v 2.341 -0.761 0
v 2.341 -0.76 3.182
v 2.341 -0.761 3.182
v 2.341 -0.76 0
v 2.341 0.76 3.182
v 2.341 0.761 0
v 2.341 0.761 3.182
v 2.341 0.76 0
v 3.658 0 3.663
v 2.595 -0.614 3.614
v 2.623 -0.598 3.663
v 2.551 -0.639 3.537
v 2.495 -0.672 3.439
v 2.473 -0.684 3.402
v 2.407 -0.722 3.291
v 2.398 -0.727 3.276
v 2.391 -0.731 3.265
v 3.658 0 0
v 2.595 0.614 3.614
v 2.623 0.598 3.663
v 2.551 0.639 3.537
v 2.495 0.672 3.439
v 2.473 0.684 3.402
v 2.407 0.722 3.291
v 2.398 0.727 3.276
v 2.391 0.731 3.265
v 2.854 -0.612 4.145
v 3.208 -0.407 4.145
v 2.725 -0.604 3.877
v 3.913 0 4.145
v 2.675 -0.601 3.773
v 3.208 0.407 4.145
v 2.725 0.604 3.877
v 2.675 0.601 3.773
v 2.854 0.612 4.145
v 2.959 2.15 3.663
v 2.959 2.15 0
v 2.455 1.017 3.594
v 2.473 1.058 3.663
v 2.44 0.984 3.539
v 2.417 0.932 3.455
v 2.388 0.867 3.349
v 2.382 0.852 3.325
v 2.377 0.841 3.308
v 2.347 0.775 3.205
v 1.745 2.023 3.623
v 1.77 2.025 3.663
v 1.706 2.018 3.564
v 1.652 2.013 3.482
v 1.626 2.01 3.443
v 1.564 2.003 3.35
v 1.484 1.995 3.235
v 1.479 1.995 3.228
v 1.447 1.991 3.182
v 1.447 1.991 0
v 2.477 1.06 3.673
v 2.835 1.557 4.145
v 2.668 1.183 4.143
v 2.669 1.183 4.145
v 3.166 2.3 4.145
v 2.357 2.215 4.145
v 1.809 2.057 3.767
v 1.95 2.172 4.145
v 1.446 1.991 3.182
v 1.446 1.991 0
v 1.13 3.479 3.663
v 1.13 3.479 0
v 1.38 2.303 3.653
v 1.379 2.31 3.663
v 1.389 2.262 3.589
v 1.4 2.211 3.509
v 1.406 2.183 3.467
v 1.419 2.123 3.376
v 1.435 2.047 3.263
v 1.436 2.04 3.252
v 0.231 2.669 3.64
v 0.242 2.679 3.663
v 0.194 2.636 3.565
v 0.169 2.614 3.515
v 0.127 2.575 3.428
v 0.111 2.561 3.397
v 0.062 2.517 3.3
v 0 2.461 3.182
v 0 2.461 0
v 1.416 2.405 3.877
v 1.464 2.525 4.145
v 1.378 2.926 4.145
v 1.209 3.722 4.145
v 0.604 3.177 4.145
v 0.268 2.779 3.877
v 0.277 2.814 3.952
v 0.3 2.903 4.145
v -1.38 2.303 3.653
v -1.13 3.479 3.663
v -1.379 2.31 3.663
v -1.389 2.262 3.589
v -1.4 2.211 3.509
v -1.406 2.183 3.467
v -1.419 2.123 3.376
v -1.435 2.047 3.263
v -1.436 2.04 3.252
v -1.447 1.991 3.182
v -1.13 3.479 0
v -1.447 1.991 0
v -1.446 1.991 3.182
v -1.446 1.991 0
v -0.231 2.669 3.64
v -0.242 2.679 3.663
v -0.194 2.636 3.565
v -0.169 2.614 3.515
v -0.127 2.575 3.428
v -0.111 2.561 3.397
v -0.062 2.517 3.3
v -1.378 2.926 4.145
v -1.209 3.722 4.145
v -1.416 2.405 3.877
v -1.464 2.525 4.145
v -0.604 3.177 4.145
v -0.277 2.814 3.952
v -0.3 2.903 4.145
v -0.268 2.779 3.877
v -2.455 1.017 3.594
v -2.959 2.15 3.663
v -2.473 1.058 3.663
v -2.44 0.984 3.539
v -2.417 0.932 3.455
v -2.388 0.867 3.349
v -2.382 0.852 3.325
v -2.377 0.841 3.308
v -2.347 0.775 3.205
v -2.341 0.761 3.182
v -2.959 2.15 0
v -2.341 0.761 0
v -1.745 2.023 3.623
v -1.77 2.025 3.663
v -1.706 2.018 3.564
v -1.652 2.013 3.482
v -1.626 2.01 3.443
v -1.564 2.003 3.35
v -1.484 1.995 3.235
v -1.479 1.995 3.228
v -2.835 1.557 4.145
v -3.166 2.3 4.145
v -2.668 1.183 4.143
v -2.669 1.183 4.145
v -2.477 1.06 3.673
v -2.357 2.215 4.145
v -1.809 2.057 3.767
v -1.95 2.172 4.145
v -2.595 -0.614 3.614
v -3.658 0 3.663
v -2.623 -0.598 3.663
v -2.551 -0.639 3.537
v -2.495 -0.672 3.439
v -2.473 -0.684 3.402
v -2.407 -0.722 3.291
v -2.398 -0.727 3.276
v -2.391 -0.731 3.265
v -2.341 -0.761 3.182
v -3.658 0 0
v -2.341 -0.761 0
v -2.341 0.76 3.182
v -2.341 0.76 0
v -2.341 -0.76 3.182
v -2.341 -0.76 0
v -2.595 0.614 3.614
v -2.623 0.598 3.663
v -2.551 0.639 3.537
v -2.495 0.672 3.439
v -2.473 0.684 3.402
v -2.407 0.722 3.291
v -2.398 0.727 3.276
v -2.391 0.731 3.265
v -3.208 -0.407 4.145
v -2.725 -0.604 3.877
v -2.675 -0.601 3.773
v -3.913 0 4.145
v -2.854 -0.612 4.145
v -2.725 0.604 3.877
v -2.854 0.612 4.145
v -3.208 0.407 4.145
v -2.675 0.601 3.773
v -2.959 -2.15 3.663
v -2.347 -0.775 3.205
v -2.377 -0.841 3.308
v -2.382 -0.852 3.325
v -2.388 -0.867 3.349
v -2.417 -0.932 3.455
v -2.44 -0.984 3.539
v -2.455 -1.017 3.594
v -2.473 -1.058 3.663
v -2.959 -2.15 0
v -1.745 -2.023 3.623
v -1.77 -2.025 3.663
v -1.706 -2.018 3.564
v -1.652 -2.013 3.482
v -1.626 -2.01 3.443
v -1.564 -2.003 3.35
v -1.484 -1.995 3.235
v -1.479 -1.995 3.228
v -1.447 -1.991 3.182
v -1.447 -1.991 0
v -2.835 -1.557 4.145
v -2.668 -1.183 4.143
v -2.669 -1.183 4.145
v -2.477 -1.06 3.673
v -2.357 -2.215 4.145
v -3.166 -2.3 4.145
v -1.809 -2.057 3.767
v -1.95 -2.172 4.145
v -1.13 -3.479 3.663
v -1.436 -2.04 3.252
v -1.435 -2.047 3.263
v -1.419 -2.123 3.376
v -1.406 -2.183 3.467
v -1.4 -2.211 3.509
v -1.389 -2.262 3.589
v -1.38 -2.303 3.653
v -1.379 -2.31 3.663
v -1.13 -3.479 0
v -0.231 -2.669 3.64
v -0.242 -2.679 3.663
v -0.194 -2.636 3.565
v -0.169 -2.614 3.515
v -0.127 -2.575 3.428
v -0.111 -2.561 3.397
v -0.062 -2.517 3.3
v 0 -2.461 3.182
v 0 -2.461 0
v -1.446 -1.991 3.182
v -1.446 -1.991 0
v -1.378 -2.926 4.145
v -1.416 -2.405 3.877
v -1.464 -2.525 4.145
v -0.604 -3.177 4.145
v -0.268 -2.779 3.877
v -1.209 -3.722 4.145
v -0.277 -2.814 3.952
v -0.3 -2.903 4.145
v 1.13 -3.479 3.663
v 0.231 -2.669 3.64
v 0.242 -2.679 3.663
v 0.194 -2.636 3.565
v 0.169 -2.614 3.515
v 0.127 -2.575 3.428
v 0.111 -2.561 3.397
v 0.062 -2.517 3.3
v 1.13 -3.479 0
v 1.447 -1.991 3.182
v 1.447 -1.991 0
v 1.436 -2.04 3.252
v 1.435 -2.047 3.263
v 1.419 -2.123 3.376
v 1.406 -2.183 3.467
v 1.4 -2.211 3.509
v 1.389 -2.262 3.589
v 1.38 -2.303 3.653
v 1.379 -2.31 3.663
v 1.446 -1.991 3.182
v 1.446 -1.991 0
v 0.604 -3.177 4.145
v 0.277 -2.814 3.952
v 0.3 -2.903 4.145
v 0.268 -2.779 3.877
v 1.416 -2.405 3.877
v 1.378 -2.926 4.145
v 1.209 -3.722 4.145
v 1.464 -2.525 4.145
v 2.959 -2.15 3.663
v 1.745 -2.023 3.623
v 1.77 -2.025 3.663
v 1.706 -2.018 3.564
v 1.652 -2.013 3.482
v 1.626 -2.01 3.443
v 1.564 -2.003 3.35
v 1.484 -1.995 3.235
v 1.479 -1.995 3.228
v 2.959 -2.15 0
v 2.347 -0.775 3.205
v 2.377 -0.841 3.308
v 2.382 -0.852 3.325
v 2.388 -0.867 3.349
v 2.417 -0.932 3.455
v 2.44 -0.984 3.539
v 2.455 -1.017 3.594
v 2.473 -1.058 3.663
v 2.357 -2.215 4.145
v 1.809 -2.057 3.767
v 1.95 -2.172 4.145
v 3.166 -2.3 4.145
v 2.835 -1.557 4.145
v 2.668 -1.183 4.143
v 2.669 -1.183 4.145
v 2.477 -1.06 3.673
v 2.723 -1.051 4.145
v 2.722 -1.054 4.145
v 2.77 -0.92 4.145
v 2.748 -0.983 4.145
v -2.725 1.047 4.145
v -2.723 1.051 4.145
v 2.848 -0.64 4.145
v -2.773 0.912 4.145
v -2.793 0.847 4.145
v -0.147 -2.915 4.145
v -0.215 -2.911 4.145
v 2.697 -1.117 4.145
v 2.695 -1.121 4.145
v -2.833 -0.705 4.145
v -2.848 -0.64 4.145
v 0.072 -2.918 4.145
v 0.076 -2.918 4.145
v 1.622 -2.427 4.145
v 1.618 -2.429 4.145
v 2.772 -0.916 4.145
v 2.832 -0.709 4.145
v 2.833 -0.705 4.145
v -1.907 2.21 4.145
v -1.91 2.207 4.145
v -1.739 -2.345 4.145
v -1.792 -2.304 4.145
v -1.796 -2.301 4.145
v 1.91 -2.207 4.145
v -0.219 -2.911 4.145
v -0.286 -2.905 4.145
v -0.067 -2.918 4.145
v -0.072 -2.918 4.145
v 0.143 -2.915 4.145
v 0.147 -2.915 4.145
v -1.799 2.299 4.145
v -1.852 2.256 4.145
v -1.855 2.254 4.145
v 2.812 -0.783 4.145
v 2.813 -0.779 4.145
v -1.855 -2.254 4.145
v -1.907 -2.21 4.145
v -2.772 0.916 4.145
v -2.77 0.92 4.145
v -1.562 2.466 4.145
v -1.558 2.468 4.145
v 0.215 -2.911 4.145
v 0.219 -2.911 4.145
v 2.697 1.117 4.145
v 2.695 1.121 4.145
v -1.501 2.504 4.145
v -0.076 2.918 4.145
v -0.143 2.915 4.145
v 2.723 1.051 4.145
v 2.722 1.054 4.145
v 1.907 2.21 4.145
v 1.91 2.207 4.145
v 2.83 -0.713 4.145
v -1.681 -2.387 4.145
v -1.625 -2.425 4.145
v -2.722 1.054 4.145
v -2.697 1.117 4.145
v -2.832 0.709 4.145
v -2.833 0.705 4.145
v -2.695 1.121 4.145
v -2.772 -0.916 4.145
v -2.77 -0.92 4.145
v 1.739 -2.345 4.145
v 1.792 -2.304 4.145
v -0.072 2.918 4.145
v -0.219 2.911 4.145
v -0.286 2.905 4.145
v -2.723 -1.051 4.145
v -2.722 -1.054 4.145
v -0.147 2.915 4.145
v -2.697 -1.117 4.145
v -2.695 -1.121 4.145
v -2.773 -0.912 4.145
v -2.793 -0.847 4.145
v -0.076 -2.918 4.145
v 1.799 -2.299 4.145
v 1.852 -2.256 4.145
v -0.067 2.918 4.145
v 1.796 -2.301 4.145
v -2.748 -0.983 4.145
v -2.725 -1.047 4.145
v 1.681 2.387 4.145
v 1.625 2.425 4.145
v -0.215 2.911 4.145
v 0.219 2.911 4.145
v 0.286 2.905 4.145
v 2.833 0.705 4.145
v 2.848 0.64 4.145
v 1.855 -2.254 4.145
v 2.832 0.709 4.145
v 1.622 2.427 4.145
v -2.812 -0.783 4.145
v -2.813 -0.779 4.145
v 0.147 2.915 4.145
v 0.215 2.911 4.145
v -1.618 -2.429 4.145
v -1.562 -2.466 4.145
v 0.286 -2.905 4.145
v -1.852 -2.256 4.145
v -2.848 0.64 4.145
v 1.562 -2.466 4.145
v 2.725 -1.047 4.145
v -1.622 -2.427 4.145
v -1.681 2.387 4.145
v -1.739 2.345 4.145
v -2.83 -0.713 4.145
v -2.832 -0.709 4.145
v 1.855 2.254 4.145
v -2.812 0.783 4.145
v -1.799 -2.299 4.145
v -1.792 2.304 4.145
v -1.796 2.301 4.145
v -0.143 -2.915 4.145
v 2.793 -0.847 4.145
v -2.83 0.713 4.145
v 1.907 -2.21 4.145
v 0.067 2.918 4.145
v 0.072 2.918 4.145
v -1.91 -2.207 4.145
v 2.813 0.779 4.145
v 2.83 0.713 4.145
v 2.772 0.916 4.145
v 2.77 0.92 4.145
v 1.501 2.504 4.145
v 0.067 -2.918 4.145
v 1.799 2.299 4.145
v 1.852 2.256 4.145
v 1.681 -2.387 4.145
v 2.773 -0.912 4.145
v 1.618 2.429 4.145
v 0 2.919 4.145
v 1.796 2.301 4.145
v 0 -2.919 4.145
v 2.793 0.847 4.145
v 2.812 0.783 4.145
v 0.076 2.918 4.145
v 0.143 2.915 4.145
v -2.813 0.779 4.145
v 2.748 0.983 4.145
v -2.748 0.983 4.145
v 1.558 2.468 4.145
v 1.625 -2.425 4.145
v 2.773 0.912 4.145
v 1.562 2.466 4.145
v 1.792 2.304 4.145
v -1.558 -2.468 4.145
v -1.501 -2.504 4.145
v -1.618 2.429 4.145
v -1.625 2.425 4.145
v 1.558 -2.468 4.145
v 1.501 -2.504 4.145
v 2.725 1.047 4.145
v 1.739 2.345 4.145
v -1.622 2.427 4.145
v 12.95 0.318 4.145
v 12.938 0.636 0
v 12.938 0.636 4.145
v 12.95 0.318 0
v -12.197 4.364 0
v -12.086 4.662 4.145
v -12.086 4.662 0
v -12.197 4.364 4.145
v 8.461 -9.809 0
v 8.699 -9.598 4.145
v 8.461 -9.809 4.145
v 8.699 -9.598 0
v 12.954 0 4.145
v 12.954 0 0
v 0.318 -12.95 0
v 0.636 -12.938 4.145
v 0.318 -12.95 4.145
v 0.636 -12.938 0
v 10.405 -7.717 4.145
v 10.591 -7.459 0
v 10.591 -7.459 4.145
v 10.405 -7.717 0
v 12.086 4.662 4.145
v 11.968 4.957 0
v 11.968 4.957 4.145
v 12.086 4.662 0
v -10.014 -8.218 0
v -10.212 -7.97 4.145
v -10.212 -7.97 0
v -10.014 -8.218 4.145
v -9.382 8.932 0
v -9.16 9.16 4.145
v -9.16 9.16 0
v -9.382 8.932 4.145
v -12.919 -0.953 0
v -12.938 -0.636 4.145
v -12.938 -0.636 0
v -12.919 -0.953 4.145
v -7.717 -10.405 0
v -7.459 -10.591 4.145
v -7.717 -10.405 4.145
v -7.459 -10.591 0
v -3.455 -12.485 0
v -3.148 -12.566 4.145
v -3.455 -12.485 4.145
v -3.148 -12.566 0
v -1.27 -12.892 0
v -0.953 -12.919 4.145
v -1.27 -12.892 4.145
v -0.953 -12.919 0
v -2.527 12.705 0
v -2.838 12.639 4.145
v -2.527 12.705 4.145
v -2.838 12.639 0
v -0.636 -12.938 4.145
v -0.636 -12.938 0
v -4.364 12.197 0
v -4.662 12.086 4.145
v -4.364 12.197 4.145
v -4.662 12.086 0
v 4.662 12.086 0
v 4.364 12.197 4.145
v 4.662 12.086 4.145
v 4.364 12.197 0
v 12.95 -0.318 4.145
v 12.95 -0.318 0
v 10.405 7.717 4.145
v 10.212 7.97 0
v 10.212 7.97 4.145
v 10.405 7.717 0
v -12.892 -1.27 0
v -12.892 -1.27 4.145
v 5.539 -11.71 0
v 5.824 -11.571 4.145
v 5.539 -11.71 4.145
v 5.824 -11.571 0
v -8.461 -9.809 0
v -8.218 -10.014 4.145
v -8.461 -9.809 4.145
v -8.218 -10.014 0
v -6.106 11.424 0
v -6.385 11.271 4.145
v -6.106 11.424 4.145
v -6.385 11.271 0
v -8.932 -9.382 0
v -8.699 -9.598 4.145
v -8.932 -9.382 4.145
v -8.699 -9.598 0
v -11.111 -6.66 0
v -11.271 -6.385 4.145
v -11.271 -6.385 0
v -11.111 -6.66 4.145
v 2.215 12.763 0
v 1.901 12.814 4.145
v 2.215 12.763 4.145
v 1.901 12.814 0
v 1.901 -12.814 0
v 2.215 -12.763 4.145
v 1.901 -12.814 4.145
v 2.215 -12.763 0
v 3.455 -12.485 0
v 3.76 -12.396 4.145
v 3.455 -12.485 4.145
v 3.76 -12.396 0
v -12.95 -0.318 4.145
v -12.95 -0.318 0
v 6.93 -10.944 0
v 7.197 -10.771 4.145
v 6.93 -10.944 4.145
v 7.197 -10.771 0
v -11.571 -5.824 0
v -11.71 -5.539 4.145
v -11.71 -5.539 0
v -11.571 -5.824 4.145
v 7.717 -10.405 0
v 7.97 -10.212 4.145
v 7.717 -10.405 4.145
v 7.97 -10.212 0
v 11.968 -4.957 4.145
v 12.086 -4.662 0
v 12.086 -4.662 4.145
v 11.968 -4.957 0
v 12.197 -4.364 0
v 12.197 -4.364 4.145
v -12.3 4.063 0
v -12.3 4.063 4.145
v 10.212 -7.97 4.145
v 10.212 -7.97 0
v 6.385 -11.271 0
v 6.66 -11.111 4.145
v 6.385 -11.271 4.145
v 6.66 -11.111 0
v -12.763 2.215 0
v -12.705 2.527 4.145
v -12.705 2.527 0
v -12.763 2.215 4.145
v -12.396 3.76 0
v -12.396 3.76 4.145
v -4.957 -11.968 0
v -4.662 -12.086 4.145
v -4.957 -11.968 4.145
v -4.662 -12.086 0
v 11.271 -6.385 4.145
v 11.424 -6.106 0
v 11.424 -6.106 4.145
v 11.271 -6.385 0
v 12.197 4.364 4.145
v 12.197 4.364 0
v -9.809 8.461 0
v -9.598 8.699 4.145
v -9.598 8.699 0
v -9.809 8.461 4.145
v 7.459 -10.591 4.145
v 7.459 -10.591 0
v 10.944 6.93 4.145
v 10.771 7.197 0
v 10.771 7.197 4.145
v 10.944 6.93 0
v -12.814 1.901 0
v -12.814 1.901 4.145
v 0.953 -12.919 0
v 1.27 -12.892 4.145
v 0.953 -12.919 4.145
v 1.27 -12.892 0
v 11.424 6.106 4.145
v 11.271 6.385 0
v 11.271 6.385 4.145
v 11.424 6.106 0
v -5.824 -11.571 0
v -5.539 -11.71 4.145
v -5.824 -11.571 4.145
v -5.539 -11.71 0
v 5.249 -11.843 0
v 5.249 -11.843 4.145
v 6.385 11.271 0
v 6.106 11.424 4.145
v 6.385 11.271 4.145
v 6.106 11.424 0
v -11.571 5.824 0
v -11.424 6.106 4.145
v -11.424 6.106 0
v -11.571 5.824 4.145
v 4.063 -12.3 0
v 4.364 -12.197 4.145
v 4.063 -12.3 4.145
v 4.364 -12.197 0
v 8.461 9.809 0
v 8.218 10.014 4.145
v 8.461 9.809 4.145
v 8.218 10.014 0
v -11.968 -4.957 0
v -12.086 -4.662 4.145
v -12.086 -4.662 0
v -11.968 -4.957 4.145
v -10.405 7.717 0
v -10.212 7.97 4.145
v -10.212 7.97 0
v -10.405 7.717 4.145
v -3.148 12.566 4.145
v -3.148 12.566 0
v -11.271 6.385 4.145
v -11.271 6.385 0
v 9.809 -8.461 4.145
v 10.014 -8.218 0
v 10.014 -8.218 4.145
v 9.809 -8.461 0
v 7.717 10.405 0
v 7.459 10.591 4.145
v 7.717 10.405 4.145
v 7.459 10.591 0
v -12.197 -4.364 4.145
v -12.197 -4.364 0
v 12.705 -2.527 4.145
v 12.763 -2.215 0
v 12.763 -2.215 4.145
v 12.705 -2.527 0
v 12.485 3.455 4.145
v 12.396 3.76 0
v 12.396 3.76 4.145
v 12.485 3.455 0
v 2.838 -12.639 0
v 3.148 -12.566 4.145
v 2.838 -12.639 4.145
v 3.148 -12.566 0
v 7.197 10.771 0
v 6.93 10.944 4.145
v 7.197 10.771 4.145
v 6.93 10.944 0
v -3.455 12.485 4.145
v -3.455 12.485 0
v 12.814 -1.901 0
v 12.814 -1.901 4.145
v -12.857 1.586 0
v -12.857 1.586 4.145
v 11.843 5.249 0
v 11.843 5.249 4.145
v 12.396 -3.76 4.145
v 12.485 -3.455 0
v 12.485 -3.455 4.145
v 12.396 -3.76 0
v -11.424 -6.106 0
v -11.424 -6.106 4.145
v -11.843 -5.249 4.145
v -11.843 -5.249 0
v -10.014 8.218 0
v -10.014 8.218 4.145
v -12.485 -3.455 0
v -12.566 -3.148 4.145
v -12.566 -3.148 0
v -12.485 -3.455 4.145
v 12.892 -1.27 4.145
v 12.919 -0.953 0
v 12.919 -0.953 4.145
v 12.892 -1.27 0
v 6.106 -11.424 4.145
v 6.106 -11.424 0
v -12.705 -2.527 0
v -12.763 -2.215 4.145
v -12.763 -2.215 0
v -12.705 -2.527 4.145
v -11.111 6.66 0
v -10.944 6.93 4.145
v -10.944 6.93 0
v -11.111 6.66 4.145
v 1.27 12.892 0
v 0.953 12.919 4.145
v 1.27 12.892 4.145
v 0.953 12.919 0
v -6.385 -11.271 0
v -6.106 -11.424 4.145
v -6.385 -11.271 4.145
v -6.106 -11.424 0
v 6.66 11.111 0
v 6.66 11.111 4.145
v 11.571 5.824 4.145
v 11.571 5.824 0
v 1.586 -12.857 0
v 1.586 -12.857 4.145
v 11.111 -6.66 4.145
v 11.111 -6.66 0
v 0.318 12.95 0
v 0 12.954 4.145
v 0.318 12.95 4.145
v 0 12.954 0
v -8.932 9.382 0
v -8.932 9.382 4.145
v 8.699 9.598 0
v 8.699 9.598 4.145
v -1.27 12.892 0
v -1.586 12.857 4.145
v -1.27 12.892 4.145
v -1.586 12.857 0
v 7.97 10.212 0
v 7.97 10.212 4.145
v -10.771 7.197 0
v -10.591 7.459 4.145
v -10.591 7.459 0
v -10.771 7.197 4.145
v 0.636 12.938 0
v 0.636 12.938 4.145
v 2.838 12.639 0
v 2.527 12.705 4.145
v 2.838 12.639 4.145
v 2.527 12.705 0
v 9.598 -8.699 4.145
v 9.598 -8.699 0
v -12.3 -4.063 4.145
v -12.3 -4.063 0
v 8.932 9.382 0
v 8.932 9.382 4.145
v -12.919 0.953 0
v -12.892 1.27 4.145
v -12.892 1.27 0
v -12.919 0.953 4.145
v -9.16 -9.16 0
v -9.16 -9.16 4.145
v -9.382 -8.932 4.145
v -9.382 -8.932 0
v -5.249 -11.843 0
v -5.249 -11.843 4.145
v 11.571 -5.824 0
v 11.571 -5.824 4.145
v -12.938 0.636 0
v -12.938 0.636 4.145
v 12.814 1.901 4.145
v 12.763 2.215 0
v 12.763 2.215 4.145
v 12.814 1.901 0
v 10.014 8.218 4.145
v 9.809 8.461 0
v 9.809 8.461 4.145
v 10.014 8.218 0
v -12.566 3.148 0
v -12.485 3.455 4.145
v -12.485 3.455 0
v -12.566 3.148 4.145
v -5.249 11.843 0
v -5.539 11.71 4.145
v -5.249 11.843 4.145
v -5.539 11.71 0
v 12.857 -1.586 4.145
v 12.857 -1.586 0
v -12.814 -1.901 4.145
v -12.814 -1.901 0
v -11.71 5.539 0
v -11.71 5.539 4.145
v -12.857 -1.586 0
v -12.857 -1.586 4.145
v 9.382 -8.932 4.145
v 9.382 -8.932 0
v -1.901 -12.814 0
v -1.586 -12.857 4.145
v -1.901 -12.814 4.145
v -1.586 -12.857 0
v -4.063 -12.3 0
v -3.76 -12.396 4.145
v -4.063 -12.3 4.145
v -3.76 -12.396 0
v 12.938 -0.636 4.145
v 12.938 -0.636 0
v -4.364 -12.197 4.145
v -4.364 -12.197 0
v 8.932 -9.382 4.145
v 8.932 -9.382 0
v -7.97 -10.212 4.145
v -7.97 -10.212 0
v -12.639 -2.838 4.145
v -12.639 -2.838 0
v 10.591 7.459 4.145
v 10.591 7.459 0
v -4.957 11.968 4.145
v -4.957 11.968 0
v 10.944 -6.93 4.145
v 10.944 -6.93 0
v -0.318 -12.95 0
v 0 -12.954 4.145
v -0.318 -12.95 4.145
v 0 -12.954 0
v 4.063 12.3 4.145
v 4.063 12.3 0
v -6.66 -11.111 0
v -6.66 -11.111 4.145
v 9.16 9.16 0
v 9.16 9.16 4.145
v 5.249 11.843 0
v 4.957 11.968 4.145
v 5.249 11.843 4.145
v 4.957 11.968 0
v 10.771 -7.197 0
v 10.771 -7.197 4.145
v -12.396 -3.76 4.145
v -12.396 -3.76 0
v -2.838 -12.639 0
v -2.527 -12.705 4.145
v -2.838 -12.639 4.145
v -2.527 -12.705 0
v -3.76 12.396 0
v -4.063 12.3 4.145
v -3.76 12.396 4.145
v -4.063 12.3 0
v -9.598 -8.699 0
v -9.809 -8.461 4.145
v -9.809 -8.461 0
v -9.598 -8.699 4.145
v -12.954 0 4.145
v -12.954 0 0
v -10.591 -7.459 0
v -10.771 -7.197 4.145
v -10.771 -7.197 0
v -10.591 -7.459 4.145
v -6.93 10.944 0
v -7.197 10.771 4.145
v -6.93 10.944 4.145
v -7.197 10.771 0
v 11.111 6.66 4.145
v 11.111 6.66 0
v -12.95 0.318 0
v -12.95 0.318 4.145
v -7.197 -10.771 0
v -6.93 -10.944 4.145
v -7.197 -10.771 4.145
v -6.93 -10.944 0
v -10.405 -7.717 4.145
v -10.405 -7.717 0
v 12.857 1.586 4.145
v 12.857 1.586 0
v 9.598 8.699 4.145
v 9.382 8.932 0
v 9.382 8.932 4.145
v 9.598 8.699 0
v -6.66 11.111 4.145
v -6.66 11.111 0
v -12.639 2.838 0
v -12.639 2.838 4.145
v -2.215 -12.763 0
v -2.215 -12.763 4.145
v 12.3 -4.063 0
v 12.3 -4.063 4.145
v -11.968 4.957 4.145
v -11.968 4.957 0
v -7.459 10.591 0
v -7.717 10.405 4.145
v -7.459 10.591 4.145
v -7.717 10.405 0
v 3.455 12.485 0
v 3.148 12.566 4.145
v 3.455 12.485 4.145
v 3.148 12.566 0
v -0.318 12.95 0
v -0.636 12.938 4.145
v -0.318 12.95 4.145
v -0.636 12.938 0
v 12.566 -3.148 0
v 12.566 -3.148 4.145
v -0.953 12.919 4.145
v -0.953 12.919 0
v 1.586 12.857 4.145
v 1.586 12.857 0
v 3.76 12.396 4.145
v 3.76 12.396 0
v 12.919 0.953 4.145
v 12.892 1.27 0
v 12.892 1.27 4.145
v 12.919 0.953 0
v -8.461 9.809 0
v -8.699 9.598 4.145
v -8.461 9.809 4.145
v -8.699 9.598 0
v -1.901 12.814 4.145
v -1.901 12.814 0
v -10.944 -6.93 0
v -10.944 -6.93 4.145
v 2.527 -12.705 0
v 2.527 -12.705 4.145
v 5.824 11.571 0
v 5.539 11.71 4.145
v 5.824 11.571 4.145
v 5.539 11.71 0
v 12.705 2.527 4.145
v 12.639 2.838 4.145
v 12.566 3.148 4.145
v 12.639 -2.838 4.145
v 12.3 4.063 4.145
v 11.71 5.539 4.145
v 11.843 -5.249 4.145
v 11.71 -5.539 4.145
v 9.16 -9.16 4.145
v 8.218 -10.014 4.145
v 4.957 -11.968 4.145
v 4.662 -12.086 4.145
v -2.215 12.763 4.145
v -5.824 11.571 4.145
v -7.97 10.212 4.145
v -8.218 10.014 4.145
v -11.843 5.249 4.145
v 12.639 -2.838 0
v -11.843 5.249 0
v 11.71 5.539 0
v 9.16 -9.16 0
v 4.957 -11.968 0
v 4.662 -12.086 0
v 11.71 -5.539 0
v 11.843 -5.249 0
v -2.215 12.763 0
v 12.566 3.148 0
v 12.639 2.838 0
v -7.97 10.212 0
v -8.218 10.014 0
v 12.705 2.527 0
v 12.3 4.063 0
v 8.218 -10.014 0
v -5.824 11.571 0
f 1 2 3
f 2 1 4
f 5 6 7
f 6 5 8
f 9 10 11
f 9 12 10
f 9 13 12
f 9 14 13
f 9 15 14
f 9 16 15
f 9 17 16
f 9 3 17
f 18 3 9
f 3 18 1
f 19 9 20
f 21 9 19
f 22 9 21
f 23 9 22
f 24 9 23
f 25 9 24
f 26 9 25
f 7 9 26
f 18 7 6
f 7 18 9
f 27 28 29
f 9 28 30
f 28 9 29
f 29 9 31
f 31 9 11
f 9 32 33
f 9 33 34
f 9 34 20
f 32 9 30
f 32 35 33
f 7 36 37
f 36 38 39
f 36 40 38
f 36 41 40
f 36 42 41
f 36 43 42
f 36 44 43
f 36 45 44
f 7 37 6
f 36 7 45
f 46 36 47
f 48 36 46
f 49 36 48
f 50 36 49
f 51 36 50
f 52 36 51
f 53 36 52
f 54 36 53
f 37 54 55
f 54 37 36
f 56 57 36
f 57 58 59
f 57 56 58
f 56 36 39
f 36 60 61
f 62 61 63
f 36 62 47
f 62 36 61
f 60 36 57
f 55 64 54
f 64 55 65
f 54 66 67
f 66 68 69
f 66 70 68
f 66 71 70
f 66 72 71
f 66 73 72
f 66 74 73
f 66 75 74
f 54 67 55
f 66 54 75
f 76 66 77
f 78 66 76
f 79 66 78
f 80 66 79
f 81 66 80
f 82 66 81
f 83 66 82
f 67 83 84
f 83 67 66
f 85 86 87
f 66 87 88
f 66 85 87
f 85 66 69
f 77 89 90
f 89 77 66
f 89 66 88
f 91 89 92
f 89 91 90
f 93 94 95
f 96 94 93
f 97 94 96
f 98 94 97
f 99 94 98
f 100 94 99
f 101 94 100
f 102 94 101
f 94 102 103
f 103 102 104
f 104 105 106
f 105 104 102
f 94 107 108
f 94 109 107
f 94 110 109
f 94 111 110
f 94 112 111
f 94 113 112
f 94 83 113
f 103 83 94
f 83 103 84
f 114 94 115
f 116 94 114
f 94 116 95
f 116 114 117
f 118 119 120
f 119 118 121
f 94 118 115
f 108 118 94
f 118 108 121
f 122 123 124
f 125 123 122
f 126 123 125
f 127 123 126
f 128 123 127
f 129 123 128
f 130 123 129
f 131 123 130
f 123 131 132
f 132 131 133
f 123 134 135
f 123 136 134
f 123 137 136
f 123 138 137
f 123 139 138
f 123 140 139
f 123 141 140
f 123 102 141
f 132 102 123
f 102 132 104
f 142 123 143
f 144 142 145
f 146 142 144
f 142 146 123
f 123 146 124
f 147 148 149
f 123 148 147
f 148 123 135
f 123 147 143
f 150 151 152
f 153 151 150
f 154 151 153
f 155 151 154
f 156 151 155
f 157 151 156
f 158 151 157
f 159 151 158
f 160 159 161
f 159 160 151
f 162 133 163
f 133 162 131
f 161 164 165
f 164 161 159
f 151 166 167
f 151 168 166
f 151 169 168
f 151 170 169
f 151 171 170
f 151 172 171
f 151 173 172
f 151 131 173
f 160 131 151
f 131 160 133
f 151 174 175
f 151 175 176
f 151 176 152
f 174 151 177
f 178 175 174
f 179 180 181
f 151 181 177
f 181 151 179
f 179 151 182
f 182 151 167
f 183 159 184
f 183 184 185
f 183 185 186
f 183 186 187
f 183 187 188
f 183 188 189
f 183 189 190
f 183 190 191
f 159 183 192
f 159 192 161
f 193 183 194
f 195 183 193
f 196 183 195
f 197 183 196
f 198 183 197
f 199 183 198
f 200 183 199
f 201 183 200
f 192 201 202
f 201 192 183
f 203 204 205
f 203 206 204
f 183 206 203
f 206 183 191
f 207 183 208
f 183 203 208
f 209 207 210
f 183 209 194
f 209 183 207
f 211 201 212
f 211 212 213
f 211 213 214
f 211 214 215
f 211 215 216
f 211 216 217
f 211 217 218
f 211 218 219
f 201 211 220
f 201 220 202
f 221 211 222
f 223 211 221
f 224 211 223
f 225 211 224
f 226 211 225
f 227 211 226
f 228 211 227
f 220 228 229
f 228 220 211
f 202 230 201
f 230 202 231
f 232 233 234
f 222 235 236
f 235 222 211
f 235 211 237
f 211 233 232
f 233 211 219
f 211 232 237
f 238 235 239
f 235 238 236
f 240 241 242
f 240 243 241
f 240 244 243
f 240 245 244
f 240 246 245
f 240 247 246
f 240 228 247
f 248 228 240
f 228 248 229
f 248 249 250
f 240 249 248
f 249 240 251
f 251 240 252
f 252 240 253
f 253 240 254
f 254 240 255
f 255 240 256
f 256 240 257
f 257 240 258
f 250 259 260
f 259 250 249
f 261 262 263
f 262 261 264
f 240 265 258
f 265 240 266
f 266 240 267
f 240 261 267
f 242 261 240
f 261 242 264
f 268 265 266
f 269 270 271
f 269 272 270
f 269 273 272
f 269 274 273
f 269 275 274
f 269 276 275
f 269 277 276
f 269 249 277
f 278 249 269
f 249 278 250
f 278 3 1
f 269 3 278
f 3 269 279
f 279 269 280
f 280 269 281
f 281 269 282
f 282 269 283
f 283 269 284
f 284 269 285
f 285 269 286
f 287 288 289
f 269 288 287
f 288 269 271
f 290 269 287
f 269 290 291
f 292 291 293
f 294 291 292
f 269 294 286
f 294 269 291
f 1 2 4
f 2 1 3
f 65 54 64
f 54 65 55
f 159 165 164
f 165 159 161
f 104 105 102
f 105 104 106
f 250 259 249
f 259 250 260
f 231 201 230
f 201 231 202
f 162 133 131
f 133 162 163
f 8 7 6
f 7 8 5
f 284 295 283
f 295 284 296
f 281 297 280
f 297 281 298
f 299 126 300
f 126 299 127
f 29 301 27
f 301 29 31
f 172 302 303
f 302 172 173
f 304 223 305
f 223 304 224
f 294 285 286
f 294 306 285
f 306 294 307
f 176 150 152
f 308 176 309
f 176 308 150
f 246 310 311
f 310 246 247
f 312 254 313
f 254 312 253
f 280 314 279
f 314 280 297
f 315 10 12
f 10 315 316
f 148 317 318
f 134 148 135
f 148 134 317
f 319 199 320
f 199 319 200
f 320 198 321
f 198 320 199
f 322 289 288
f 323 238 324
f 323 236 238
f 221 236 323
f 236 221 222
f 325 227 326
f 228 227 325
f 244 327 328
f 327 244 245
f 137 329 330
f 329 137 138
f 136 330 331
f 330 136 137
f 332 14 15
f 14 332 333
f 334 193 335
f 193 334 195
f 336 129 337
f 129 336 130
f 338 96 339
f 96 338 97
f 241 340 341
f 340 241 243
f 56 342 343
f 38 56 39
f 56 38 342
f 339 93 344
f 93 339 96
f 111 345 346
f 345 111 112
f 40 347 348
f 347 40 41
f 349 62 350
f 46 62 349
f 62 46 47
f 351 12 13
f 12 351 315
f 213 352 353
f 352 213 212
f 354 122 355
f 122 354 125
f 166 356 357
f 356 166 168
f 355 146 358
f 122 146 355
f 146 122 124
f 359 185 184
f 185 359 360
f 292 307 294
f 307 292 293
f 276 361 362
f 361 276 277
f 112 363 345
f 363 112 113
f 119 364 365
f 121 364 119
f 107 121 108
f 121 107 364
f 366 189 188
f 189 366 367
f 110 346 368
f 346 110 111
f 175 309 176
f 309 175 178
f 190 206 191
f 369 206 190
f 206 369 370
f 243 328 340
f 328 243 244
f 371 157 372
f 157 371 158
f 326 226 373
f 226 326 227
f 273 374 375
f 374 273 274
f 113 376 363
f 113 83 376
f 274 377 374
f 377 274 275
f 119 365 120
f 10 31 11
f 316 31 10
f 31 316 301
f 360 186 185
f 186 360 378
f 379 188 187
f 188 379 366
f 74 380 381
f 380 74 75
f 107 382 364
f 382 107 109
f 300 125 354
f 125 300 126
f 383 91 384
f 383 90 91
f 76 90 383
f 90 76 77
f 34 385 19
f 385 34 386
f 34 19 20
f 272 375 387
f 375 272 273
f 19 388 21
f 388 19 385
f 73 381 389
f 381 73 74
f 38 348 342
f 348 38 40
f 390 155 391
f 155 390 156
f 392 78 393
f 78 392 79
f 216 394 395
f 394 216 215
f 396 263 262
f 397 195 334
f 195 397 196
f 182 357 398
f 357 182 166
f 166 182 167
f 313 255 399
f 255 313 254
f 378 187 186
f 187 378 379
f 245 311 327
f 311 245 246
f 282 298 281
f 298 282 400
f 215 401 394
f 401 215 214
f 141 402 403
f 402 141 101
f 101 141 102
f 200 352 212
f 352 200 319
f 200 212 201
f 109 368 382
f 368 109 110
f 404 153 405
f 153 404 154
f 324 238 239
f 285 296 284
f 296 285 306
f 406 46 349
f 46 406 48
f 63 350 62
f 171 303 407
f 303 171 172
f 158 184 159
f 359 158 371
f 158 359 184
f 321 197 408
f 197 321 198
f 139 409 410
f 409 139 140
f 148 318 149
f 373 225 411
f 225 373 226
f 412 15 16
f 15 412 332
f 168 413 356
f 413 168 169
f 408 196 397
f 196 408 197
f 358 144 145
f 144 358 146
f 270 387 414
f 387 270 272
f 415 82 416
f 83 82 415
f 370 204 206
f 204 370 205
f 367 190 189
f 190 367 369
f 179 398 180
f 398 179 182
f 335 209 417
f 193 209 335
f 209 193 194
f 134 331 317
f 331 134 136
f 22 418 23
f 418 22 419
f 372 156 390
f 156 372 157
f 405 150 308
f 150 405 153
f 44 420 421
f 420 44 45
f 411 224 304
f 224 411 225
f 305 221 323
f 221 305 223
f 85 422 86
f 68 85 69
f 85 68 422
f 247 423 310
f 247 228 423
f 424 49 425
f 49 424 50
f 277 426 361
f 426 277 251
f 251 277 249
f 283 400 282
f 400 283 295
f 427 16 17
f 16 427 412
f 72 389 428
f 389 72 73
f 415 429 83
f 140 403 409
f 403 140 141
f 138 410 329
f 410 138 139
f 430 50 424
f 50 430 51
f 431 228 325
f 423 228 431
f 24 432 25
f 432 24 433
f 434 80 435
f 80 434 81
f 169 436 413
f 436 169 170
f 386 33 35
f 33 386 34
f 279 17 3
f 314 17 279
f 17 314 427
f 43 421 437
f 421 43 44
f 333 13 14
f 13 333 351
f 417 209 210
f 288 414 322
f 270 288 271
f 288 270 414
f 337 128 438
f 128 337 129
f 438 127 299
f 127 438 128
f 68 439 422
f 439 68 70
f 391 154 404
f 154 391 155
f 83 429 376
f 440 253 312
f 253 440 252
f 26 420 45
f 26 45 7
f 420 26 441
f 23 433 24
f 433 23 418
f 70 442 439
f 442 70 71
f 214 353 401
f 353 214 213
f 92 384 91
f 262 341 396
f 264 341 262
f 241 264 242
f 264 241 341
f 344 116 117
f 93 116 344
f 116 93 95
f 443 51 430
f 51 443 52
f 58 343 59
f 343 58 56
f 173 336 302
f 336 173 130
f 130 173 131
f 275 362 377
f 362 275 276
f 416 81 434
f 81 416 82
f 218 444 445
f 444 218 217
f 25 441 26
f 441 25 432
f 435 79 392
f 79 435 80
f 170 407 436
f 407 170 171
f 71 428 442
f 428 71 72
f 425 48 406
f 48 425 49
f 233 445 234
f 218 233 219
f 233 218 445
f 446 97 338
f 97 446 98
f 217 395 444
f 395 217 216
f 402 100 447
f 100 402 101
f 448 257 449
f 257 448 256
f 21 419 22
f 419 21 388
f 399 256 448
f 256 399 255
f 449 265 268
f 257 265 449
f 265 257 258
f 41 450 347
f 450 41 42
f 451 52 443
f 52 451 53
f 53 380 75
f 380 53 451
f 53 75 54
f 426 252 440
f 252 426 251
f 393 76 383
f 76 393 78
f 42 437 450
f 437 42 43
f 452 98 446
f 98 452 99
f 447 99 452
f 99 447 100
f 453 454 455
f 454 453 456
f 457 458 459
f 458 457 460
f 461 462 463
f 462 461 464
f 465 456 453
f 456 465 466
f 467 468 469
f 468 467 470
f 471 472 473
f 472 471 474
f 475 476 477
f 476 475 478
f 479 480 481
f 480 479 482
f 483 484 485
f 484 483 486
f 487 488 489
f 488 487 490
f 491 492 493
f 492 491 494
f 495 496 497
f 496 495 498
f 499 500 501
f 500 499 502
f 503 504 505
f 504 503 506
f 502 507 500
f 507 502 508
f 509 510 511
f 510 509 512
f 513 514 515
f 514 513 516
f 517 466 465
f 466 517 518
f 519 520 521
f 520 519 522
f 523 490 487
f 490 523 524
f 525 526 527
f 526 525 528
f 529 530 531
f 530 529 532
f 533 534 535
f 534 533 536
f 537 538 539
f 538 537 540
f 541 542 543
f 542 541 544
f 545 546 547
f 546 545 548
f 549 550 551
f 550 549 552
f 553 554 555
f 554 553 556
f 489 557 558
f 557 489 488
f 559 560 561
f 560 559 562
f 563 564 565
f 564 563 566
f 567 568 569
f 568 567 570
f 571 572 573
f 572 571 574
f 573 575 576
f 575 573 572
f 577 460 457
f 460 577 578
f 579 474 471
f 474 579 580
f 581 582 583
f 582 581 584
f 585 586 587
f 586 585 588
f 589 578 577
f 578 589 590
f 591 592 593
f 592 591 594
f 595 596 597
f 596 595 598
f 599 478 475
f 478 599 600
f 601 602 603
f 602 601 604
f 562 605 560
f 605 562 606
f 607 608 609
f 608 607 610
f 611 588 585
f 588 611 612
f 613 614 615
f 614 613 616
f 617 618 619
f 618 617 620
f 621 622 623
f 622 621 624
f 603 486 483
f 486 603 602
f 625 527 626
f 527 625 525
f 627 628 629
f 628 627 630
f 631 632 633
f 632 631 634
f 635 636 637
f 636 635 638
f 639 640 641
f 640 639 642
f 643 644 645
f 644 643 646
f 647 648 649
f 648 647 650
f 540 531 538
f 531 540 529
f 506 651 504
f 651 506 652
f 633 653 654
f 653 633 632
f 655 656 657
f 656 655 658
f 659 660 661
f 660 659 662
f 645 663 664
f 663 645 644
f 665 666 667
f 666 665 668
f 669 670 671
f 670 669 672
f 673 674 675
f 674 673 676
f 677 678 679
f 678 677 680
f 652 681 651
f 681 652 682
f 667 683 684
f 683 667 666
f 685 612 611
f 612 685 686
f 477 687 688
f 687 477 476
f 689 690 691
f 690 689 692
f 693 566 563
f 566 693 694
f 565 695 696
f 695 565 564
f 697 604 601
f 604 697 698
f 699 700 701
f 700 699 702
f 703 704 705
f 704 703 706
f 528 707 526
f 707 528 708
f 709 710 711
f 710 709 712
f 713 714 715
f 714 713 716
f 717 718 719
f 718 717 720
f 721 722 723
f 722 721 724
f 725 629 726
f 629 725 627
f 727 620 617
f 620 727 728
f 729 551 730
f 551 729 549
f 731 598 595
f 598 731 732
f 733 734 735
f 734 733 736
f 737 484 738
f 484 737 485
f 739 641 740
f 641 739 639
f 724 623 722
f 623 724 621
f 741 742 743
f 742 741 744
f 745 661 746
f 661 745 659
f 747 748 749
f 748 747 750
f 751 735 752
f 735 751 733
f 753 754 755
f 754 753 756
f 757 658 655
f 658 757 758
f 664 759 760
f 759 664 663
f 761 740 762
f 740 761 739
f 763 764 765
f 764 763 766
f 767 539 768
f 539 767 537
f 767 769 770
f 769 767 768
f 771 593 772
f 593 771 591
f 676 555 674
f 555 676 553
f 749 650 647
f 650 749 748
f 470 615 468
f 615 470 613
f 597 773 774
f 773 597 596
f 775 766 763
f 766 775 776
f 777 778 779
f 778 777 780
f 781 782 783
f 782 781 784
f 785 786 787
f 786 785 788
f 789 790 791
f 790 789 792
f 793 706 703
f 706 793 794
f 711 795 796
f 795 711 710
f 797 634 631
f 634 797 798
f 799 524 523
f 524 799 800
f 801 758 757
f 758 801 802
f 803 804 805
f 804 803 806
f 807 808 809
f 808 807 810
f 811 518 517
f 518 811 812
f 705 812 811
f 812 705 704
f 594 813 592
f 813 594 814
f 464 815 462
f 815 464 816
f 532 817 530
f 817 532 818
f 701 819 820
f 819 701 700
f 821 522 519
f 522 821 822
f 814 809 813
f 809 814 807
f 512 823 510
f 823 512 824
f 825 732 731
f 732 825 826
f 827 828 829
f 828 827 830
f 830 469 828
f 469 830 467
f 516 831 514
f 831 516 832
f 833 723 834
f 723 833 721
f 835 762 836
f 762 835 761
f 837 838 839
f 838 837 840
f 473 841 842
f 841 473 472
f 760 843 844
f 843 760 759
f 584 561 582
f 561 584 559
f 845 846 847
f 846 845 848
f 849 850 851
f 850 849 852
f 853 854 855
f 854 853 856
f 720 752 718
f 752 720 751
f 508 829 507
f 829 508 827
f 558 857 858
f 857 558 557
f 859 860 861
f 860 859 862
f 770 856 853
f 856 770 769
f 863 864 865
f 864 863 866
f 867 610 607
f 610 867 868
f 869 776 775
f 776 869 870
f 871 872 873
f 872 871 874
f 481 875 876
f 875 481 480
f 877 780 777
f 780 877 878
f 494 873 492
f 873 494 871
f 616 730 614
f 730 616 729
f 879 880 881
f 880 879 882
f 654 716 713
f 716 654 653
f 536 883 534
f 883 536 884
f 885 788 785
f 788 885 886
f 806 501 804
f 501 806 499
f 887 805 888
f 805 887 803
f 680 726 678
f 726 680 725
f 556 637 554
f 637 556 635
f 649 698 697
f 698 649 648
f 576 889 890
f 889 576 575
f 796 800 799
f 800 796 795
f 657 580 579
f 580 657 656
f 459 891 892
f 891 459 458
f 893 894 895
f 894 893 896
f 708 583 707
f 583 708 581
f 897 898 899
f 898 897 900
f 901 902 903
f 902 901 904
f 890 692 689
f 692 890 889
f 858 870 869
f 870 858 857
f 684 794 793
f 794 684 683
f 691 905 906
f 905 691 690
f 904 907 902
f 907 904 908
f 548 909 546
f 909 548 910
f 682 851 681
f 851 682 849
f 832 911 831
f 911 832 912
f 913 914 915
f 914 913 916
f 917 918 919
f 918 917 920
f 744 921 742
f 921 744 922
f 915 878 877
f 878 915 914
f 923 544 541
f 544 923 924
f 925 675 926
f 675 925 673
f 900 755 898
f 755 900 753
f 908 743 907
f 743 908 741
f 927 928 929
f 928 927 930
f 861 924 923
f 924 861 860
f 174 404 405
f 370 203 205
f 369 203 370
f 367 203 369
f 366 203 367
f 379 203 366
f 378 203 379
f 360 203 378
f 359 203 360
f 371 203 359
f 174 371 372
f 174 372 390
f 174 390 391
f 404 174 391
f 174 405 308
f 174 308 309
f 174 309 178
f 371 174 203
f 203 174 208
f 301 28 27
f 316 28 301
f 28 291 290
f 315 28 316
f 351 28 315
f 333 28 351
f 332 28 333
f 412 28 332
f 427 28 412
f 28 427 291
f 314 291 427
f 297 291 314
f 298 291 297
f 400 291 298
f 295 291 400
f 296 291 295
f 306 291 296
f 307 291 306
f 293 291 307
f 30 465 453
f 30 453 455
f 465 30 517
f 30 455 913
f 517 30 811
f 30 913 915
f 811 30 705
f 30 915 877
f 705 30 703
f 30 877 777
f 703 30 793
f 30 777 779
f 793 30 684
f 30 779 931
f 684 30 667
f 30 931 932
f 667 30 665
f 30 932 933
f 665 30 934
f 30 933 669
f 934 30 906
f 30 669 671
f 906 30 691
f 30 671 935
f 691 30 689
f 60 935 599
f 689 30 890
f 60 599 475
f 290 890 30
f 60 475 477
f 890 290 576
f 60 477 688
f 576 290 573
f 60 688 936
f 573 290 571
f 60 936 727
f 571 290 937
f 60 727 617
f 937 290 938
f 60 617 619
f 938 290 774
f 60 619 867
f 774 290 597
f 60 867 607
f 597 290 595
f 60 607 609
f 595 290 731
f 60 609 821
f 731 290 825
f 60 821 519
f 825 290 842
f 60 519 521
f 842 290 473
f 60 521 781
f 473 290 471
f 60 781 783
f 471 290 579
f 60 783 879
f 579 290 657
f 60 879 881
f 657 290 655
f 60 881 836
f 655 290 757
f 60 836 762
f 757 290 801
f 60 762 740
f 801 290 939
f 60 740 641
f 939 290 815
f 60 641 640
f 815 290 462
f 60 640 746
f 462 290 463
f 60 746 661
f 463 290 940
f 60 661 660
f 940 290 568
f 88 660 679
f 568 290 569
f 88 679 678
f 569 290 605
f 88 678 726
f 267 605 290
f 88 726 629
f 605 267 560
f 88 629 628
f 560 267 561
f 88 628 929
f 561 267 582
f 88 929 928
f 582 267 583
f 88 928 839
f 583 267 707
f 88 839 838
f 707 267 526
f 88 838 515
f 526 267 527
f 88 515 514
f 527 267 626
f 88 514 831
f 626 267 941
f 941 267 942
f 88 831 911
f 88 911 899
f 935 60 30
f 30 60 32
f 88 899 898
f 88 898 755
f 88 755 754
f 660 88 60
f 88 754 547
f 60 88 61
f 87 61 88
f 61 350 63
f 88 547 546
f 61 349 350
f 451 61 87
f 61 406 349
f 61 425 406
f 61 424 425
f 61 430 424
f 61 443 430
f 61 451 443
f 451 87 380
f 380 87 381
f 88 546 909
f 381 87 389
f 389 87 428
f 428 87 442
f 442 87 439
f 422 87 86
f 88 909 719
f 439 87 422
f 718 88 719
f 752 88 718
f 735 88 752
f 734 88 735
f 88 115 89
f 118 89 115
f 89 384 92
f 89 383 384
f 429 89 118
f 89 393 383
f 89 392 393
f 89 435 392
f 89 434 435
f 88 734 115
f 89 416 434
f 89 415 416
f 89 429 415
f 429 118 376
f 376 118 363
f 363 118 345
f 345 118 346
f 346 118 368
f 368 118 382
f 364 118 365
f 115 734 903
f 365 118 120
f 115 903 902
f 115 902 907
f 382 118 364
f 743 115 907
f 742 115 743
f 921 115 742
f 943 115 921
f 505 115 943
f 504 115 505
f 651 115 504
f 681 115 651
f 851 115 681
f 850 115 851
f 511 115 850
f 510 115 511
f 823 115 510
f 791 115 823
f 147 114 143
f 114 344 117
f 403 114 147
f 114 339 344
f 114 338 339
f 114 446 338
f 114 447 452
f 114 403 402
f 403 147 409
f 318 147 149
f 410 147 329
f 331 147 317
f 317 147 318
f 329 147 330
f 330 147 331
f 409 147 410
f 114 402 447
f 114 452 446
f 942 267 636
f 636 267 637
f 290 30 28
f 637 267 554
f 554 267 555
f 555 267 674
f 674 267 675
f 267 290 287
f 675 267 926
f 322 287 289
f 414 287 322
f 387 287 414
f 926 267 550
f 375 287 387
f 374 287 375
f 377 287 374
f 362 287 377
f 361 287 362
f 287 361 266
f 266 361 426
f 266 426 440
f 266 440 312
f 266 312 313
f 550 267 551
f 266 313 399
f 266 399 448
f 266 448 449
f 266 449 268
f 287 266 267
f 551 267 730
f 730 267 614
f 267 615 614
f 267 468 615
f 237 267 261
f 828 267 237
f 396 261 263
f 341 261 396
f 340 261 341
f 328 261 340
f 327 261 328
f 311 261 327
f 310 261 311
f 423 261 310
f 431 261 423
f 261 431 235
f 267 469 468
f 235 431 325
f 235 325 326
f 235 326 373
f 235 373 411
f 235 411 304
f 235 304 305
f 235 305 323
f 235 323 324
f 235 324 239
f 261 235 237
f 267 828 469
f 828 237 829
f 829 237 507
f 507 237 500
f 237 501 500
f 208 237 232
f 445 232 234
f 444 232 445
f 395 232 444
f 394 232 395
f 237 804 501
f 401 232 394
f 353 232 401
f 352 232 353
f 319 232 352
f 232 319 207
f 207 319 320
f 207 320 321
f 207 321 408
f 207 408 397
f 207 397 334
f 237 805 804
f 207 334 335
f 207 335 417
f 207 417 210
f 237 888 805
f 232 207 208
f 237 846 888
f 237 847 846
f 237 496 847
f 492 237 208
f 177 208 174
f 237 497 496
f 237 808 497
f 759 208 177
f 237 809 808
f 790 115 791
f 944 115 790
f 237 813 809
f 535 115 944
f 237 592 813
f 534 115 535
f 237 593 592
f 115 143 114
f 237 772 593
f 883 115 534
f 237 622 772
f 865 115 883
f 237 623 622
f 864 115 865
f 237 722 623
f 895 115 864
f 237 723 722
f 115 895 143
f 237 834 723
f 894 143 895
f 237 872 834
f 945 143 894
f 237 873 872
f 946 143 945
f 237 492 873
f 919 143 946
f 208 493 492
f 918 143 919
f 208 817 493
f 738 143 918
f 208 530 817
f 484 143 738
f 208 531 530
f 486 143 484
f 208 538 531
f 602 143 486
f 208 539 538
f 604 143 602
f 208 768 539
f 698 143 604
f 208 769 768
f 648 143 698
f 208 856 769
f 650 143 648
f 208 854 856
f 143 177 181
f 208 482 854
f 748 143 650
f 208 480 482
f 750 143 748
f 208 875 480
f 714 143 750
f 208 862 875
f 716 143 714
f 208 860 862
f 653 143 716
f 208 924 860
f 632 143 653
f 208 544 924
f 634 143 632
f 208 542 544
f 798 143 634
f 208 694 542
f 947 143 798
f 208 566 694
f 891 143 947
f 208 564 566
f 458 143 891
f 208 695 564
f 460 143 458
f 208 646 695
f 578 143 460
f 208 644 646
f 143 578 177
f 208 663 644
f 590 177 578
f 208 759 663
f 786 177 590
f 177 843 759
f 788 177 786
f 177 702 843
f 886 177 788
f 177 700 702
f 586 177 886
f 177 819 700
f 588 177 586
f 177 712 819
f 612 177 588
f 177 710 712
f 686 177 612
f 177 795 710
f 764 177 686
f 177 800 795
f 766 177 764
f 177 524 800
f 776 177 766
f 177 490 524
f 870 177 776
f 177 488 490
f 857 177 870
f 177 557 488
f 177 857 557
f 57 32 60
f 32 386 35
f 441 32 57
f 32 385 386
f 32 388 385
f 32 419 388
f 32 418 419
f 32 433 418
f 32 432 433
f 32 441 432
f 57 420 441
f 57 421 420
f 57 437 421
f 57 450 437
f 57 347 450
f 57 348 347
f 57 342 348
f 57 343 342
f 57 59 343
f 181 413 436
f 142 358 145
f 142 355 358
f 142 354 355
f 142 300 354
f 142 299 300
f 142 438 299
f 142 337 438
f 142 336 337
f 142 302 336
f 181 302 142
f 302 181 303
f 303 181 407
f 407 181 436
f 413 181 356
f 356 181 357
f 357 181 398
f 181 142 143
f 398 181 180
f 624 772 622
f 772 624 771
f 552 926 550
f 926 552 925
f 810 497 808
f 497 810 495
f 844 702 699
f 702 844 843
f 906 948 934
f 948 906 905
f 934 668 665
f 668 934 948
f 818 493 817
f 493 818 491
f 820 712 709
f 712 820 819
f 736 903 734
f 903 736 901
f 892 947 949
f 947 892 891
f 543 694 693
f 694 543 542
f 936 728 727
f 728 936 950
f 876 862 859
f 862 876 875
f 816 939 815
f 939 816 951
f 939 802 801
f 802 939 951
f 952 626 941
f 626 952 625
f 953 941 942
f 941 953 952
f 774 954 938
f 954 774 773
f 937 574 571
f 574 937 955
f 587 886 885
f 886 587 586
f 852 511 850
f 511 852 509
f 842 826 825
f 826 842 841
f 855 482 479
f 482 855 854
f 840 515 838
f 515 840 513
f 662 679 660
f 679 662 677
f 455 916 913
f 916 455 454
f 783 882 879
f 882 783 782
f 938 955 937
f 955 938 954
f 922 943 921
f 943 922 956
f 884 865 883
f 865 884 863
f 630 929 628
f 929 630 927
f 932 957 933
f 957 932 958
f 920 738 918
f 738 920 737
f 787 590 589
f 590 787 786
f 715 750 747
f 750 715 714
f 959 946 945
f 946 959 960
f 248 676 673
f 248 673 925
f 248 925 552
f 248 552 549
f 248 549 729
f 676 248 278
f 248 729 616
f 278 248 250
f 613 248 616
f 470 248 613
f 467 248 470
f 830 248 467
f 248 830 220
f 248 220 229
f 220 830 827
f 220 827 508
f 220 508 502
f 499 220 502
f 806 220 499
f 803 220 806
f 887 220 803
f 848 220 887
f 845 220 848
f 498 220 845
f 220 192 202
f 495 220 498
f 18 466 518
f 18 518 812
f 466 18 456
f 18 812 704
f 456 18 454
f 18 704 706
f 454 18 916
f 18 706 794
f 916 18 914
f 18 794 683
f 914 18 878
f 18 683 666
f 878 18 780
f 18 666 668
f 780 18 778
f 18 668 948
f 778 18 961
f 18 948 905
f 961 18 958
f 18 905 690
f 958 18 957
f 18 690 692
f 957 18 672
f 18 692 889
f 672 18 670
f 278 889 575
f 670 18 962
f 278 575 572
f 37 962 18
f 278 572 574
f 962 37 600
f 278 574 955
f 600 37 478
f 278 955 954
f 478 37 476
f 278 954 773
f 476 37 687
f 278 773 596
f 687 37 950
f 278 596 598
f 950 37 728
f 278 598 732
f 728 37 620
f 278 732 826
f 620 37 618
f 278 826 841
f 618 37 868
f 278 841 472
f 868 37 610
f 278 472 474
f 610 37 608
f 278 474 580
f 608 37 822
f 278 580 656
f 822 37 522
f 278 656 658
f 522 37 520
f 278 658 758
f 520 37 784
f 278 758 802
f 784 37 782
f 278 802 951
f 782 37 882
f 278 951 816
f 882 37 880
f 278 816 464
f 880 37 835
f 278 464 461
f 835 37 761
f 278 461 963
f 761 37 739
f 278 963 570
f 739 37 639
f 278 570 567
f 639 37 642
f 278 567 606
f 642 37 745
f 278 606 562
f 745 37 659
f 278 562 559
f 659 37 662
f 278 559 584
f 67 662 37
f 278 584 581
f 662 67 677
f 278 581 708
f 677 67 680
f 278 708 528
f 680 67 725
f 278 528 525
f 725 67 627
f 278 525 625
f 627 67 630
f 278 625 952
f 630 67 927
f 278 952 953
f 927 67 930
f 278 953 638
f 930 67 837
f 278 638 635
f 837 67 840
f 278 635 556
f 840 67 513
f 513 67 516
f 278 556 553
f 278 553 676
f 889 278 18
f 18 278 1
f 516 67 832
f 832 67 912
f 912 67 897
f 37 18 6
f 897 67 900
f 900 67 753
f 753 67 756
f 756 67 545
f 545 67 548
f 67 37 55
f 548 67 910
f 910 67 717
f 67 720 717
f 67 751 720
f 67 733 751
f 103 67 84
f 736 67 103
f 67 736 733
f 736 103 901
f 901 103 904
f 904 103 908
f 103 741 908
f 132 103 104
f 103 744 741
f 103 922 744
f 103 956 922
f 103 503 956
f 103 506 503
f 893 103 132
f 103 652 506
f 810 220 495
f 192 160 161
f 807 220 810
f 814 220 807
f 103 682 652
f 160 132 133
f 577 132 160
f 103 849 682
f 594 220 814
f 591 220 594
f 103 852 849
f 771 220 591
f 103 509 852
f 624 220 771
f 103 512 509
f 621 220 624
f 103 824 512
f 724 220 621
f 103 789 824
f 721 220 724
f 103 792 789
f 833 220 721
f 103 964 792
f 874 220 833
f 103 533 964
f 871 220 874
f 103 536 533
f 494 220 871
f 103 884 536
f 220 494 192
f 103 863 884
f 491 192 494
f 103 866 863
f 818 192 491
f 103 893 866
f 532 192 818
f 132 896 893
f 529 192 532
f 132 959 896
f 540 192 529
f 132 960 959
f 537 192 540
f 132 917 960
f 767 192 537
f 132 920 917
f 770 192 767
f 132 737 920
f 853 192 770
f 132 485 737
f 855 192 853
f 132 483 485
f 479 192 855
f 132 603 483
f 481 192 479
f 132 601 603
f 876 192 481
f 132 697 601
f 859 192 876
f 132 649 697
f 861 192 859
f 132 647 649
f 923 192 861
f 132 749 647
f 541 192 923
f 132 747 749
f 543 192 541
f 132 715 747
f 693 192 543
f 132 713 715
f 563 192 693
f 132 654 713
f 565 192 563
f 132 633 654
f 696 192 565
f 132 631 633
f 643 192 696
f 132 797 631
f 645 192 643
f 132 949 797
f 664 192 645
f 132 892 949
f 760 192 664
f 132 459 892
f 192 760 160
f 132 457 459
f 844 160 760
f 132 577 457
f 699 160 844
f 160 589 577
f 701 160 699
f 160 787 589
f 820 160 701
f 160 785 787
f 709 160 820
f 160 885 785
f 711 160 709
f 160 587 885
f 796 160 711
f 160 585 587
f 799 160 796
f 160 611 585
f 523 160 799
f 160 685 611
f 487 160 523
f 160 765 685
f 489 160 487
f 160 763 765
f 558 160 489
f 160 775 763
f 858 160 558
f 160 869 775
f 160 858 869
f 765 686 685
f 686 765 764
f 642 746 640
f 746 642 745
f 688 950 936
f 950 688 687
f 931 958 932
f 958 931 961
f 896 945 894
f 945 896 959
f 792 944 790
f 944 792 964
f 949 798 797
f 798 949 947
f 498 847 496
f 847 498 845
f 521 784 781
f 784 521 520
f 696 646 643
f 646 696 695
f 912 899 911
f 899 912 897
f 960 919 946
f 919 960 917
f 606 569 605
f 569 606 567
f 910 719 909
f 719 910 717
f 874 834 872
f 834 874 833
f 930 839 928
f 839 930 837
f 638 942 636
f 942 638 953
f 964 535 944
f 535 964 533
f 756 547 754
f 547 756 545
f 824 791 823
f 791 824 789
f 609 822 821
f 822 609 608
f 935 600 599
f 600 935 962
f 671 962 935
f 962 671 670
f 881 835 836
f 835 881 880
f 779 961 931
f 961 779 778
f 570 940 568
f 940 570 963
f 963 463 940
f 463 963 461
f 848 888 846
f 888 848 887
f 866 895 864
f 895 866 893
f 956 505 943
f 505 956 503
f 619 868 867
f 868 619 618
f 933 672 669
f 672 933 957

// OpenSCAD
// Wheel with a mating surface to a gear pressed onto a stepper motor
//
// Copyright 2018,2019 by Bob Frazier and S.F.T. Inc.
//
// There is no restriction as to how this file can be used


function scaler(n) = n * 0.254 * 1.02;
  // convert 1/100 inch to millimeters
  // with 1.02 shrink factor
function anti_scaler(n) = (n / 0.254) / 1.02;

$gd=scaler(19)/2; // 0.19" 'gear' diam (inside)

$gh=scaler(16);  // 0.10" 'gear' height

$od=scaler(100)/2; // outer wheel diameter

$tc=10; // number of gear teeth

// accuracy parameters
$fn=256; // number of faces in shape

module tooth(r,h,n,tot) // r=radius,
{ //        h=heght, n=egment,
  //        tot=total # of segments

  // center of equilateral triangle with
  // a base of 'A' has a delta Y of A/3

  // the chord length 'A' is equal
  // to 2 * r * sin(th / 2)

  th=360 / tot; // theta angle of chord
  aa=2 * r * sin(th / 2); // length of chord
  ah=sin(60)*aa; // height of triangle
  cx1=cos((n * th) - th / 2) * r;
  cx2=cos((n * th) + th / 2) * r;
  cy1=sin((n * th) - th / 2) * r;
  cy2=sin((n * th) + th / 2) * r;

  // get x,y for the 'tip'
  cx3=(cx1+cx2)/2 + cos(n * th) * ah;
  cy3=(cy1+cy2)/2 + sin(n * th) * ah;

  h2=scaler(4);
  h1=h-h2;

  if(n == 0)
  {
    // echo out the various tooth sizes as
    // calculated.  it's a bit easier to
    // tweek things to match using the
    // gear diameter so that gear teeth
    // will mesh.
    echo("gear wheel radius: ", anti_scaler(r));
    echo("Tooth side length: ", anti_scaler(ah));
    echo("gear radius:  ", anti_scaler(sqrt(cx3*cx3+cy3*cy3)));
  }

  union()
  {
    color("blue")
      translate([0,0,0])
        linear_extrude(height=h1, scale=1)
          polygon(points=[[cx1,cy1],[cx2,cy2],[cx3,cy3]]);

    color("orange")
      translate([0,0,h1])
        linear_extrude(height=h2, center=true , scale=1.15)
          polygon(points=[[cx1,cy1],[cx2,cy2],[cx3,cy3]]);
  }
}

color("red")
  difference()
  {
    translate(0,0,0)
      linear_extrude(height=$gh)
        circle($od, center=true);

    union()
    {
      translate([0,0,-1])
        color("green")
          linear_extrude(height=$gh+scaler(4))
            circle($gd, center=true);

      translate([0,0,$gh+scaler(4)-2])
        color("green")
          linear_extrude(height=scaler(4),scale=1.2)
            circle($gd, center=true);

      for(i=[0:$tc-1])
      {
       translate([0,0,-1])
        tooth($gd,$gh+scaler(8),i,$tc);
      }
    };

  }
